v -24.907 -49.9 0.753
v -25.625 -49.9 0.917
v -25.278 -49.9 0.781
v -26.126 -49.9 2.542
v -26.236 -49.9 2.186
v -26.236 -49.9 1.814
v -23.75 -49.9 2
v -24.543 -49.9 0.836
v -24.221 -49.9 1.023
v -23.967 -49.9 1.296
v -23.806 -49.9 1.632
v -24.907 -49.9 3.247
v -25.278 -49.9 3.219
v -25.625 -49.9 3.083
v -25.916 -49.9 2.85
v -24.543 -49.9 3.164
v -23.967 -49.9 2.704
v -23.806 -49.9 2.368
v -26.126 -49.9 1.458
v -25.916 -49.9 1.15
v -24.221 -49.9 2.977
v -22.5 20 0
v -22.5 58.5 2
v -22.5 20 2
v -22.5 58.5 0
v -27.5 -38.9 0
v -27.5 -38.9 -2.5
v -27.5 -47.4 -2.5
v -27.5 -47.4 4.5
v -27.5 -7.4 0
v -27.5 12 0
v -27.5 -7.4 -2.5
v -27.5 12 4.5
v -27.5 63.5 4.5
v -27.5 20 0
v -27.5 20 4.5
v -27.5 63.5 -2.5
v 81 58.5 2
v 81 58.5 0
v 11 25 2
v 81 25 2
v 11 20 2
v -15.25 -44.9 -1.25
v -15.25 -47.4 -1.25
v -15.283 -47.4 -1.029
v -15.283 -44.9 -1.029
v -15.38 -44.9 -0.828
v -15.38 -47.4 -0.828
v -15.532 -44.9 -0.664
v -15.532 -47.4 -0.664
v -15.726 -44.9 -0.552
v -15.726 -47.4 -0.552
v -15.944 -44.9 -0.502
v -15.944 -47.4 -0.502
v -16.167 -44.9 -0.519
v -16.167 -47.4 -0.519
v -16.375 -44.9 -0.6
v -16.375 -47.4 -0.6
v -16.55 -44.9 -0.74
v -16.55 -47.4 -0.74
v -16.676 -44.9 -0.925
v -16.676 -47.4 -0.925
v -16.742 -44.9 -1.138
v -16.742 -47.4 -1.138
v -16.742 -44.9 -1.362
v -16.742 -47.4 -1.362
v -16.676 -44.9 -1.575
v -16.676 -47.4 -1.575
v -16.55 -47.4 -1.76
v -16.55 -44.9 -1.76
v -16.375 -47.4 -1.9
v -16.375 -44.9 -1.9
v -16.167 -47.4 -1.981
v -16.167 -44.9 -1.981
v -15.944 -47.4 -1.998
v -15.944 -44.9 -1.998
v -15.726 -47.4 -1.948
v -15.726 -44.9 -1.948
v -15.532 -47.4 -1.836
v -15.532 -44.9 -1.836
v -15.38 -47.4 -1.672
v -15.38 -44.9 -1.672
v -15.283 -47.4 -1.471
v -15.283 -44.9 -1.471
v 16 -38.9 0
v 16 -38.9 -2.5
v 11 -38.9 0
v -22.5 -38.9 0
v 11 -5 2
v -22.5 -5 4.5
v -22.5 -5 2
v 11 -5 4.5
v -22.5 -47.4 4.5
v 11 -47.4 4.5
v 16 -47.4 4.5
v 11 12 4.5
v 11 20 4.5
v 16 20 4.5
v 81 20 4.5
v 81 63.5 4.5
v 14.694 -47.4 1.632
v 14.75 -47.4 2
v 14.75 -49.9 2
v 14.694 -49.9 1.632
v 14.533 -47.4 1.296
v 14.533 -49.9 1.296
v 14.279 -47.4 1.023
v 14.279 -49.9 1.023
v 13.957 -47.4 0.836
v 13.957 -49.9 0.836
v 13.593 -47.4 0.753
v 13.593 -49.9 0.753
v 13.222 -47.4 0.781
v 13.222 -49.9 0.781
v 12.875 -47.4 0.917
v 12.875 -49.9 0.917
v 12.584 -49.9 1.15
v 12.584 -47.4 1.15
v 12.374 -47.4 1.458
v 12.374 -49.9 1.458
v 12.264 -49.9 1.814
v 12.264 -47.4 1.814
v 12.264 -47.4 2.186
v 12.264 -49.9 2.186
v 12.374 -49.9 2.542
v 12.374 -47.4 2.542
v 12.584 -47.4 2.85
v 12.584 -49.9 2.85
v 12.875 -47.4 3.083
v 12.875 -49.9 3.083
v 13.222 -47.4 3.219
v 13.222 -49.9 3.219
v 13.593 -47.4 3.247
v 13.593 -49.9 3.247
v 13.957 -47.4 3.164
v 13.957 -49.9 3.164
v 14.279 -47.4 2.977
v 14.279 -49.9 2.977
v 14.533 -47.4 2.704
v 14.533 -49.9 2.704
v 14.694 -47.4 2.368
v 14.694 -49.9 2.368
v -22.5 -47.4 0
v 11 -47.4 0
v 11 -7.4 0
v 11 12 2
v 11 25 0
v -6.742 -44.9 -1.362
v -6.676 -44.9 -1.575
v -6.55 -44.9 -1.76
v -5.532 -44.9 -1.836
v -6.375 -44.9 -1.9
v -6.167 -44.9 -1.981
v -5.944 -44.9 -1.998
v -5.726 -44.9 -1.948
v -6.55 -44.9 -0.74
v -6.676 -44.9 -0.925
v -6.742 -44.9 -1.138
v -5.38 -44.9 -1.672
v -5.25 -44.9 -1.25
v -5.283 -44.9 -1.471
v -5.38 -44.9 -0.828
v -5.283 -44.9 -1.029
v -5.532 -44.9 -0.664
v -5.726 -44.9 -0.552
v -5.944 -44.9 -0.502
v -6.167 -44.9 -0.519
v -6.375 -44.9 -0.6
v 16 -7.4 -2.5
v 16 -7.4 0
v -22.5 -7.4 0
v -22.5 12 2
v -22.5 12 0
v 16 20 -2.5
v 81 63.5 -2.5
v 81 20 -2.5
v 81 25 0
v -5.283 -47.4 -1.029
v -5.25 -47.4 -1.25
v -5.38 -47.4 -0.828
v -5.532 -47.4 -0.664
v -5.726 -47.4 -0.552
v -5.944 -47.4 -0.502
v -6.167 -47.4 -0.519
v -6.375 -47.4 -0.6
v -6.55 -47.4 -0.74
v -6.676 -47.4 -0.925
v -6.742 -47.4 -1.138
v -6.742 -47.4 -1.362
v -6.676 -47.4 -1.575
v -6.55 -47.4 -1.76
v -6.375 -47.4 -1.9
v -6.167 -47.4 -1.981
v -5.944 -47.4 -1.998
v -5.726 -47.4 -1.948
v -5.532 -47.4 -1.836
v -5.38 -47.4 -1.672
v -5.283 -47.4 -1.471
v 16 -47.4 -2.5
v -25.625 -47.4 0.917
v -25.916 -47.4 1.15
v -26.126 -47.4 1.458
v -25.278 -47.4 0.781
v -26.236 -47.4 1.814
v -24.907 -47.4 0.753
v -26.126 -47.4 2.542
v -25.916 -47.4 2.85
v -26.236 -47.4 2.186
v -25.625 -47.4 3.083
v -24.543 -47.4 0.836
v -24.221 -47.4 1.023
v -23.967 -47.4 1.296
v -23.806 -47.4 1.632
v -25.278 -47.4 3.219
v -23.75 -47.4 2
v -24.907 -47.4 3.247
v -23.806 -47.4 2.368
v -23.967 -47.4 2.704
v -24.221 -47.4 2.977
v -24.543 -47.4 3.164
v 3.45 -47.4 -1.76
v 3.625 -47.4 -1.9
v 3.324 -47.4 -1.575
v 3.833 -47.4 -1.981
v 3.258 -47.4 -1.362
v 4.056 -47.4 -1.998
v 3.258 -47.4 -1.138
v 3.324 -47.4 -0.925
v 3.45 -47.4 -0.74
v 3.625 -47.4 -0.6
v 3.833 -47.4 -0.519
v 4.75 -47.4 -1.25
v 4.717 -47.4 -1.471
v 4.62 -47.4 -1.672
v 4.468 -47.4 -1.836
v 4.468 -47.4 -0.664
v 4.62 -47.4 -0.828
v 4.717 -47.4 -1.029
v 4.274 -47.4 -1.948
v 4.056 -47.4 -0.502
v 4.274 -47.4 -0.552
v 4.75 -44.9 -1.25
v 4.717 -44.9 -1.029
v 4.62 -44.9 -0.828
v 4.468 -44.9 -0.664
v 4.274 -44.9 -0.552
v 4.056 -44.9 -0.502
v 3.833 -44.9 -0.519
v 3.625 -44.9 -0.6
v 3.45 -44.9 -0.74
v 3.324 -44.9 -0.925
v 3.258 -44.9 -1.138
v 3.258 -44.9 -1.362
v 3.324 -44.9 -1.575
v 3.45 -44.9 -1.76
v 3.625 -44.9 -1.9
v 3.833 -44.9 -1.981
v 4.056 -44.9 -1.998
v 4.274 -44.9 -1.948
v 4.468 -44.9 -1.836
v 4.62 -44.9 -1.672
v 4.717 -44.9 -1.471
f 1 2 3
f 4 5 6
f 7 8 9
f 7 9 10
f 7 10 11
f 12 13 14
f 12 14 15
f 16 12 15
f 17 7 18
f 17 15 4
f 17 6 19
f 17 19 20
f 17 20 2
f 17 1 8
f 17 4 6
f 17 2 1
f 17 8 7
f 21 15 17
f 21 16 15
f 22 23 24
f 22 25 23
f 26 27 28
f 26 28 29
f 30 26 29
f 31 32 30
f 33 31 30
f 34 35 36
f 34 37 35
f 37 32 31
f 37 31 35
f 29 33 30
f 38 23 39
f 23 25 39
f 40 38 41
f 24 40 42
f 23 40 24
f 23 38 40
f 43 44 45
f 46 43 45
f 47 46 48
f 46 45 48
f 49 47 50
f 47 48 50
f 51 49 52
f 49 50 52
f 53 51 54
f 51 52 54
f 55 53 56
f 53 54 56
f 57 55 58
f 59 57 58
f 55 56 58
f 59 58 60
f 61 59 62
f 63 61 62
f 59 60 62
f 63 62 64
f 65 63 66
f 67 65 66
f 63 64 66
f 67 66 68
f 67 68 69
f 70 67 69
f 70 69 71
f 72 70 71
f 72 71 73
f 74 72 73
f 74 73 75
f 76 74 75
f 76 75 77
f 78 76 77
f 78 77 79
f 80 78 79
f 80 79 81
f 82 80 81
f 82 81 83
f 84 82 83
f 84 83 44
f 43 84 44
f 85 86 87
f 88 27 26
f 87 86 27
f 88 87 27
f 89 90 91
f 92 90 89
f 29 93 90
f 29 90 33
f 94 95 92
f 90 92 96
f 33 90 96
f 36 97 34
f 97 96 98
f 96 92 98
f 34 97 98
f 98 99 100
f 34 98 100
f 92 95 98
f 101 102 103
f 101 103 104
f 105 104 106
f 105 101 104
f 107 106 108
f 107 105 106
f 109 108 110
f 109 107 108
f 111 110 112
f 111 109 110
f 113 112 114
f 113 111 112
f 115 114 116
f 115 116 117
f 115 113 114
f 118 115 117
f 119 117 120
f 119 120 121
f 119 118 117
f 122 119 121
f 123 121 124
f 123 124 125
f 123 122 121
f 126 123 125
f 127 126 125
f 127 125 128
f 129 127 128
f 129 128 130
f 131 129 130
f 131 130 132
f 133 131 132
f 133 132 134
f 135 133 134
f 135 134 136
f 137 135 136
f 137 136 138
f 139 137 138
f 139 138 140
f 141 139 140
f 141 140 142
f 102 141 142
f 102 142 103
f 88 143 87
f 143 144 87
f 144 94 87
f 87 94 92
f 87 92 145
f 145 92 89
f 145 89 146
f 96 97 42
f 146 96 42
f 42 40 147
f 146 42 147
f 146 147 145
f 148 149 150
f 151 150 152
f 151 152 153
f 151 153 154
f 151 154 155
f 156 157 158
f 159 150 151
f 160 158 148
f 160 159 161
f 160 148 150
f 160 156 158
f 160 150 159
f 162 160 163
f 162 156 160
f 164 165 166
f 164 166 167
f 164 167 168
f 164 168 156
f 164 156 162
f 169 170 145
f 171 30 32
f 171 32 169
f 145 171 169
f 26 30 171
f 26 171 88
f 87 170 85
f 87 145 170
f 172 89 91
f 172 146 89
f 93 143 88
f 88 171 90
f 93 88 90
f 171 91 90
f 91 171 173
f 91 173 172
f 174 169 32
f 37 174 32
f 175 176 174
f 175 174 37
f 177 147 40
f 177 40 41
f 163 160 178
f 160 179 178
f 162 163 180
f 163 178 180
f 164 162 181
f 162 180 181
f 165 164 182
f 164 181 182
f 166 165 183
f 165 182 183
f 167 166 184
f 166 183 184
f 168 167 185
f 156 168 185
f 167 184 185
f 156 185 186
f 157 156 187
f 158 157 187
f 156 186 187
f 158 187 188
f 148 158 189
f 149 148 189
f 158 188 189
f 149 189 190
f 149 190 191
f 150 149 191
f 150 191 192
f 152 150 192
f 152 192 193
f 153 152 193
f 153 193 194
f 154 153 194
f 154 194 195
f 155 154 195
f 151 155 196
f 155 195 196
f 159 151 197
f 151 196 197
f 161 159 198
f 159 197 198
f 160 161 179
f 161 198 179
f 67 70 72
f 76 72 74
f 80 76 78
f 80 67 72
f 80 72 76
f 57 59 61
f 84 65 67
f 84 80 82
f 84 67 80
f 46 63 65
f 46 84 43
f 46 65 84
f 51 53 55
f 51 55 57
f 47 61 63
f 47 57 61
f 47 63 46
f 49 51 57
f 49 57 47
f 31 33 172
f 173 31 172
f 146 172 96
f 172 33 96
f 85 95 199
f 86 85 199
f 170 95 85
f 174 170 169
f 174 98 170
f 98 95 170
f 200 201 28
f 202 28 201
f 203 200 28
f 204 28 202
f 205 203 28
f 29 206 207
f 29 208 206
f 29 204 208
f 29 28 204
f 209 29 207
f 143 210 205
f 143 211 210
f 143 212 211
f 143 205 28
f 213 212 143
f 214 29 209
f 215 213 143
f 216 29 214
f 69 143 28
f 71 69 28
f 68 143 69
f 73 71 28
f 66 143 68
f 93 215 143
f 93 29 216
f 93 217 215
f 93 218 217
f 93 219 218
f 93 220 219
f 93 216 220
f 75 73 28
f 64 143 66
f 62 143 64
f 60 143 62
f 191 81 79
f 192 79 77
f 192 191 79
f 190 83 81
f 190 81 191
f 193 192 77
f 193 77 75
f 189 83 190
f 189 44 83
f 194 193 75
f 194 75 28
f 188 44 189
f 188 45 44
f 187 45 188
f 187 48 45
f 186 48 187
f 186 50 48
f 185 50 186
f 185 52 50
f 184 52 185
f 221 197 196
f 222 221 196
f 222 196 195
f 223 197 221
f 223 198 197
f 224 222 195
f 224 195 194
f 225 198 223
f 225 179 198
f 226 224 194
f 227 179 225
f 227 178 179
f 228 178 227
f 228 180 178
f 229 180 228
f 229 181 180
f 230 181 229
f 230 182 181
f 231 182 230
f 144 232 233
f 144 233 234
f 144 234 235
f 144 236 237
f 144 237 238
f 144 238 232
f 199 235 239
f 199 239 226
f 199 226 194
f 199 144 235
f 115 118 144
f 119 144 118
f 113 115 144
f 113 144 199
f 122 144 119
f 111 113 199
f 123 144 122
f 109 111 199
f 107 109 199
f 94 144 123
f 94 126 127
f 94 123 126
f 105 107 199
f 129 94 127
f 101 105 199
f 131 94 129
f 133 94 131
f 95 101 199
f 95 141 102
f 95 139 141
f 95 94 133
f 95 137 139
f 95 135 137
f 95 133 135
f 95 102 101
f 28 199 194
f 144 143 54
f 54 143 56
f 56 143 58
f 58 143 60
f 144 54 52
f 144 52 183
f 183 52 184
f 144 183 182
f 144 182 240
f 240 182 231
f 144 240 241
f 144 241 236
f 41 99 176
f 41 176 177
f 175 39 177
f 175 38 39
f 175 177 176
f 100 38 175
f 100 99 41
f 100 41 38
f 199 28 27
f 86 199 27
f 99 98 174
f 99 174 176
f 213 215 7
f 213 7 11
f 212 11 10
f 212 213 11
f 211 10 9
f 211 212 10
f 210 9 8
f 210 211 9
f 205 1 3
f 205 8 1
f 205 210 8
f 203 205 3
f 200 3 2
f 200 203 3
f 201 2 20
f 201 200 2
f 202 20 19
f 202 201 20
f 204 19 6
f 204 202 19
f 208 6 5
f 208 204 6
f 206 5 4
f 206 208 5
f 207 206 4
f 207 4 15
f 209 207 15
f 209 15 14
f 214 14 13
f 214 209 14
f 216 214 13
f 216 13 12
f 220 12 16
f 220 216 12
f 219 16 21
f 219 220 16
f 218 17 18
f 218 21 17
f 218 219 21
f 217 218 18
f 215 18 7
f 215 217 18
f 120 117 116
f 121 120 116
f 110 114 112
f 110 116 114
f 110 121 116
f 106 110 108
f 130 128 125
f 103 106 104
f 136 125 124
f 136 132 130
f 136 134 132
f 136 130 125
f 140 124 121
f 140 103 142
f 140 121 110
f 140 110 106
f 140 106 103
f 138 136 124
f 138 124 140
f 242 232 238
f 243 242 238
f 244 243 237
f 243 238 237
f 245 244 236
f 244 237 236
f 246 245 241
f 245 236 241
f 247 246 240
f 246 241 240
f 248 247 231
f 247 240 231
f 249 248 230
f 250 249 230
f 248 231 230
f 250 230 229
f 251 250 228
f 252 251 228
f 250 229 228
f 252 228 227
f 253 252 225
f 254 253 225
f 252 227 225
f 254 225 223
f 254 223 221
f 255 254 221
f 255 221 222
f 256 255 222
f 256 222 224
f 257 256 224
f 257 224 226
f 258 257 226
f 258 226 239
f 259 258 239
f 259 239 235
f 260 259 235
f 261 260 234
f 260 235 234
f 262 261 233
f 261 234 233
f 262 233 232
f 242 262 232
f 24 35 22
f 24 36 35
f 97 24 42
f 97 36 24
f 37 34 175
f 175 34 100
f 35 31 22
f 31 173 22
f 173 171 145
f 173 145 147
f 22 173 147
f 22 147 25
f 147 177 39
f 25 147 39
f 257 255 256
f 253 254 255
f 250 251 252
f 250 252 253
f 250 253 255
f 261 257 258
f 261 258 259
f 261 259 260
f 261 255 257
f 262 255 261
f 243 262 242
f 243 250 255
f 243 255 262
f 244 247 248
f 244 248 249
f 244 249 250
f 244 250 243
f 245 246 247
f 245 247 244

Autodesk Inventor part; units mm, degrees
ref_plane "YZ Plane" through (0, 0, 0) normal (1, 0, 0) x (0, 1, 0)
sketch "Boceto1" plane through (0, 0, 0) normal (0, 0, 1) x (1, 0, 0)
  line L0 (81, 20) -> (81, 63.5)
  line L1 (-27.5, 63.5) -> (-27.5, -5)
  line L2 (-27.5, -5) -> (16, -5)
  line L3 (16, -5) -> (16, 20)
  line L4 (11, 25) -> (11, -5)
  line L5 (-22.5, 58.5) -> (-22.5, -5)
  line L6 (11, 25) -> (81, 25)
  line L7 (-27.5, 63.5) -> (81, 63.5)
  line L8 (-22.5, 58.5) -> (81, 58.5)
  line L9 (16, 20) -> (81, 20)
  point P0 (0, 0)
  dimension "d7" = 5
  dimension "d68" = 5
  dimension "d69" = 33.5
  dimension "d74" = 5
  dimension "d75" = 33.5
  dimension "d76" = 5
  dimension "d77" = 70
  dimension "d111" = 30
extrude "Extrusión1" add sketch "Boceto1" against normal blind 2.5
extrude "Extrusión2" add sketch "Boceto1" along normal blind 1 contours L9 L3 L2 L4 L6 L0 | L8 L5 L2 L1 L7 L0
ref_plane "Plano de trabajo3" through (29.25, 58.5, 1) normal (0, 0, 1) x (1, 0, 0)
mirror "Simetría3" about plane through (29.25, 58.5, 1) normal (0, 0, 1) of "Extrusión2", "Extrusión1"
sketch "Boceto6" plane through (-27.5, 63.5, 4.5) normal (0, 0, 1) x (1, 0, 0)
  line L0 (108.5, -43.5) -> (43.5, -43.5) projected
  line L1 (0, -68.5) -> (0, 0) projected
  line L2 (0, -43.5) -> (0, -51.5)
  line L3 (43.5, -43.5) -> (43.5, -68.5) projected
  line L4 (0, -43.5) -> (38.5, -43.5)
  line L5 (38.5, -68.5) -> (38.5, -38.5) projected
  line L6 (0, -51.5) -> (38.5, -51.5)
  line L7 (38.5, -43.5) -> (38.5, -51.5)
  point P0 (27.5, -63.5)
  point P1 (43.5, -51.5)
  dimension "d78" = 8
extrude "Extrusión11" cut sketch "Boceto6" against normal blind 4.5
sketch "Boceto7" plane through (-27.5, -5, -2.5) normal (-1, 0, 0) x (0, 0, 1)
  line L0 (0, 0) -> (0, 68.5) projected
  line L1 (0, 0) -> (0, -42.4)
  line L2 (0, 0) -> (7, 0) projected
  line L3 (0, 0) -> (7, 0)
  line L4 (7, 0) -> (7, -42.4)
  line L5 (0, -42.4) -> (86.5, -192.2224)
  line L6 (86.5, -192.2224) -> (89, -192.2224)
  line L7 (89, -192.2224) -> (92.375, -190.2738)
  line L8 (2.5, 0) -> (2.5, -42.4)
  line L9 (0, 0) -> (7, 0) projected
  line L10 (0, 0) -> (2.5, 0)
  line L11 (86.5, -192.2224) -> (89, -192.2224)
  line L12 (89, -192.2224) -> (92.375, -190.2738)
  line L13 (2.5, -42.4) -> (89, -192.2224)
  line L14 (0, -42.4) -> (-1.0904, -42.4)
  line L15 (7, -42.4) -> (92.375, -190.2738)
  line L16 (86.5, -187.8923) -> (89.875, -185.9437)
  point P0 (2.5, 5)
  point P1 (4.5, 0)
  point P2 (-0.5452, -42.4)
  dimension "d81" = 42.4
  dimension "d82" = 173
  dimension "d88" = 120
  dimension "d108" = 5
ref_plane "Plano de trabajo4" through (-5.75, -5, -2.5) normal (1, 0, 0) x (0, 0, -1)
extrude "Extrusión12" add sketch "Boceto7" against normal blind 21.75 contours L2 L8 L13 L6 L5 L1
extrude "Extrusión13" add sketch "Boceto7" against normal blind 5 contours L2 L4 L15 L16 L13 L8
extrude "Extrusión14" add sketch "Boceto7" against normal blind 21.75 contours L13 L16 L15 L7
mirror "Simetría4" about plane through (-5.75, -5, -2.5) normal (1, 0, 0) of "Extrusión12", "Extrusión13", "Extrusión14"
sketch "Boceto8" plane through (-22.5, -47.4, 0) normal (0, 0.5, 0.866) x (1, 0, 0)
  line L0 (0, 0) -> (33.5, 0) projected
  line L1 (16.75, 0) -> (16.75, -5)
  circle A0 centre (16.75, -15.25) radius 10.25
  line L2 (16.75, -25.5) -> (16.75, -30.5)
  circle A1 centre (16.75, -41.5) radius 11
  line L3 (16.75, -52.5) -> (16.75, -57.5)
  circle A2 centre (16.75, -68.69) radius 11.19
  line L4 (16.75, -79.88) -> (16.75, -84.88)
  circle A3 centre (16.75, -96.38) radius 11.5
  line L5 (16.75, -107.88) -> (16.75, -112.88)
  circle A4 centre (16.75, -125.07) radius 12.19
  line L6 (16.75, -137.26) -> (16.75, -142.26)
  circle A5 centre (16.75, -155.01) radius 12.75
  point P0 (22.5, 41.0496)
  dimension "d105" = 25.5
  dimension "d94" = 5
  dimension "d95" = 20.5
  dimension "d96" = 5
  dimension "d97" = 5
  dimension "d98" = 5
  dimension "d99" = 5
  dimension "d100" = 5
  dimension "d101" = 22
  dimension "d102" = 22.38
  dimension "d103" = 23
  dimension "d104" = 24.38
extrude "Extrusión15" cut sketch "Boceto8" against normal blind 21.75
sketch "Boceto9" plane through (-27.5, 63.5, -2.5) normal (-1, 0, 0) x (0, 0, 1)
  line L0 (2.5, -51.5) -> (2.5, -110.9) projected
  line L1 (0, 0) -> (0, -110.9) projected
  line L2 (0, -110.9) -> (2.5, -110.9)
  line L3 (2.5, -110.9) -> (2.5, -70.9)
  line L4 (2.5, -70.9) -> (0, -70.9)
  line L5 (0, -70.9) -> (0, -110.9)
  line L6 (0, -43.5) -> (0, -110.9) projected
  line L7 (0, -102.4) -> (2.5, -102.4)
  point P0 (2.5, -63.5)
  point P1 (7, -110.9)
  dimension "d109" = 2.5
  dimension "d110" = 40
  dimension "d112" = 31.5
extrude "Extrusión16" cut sketch "Boceto9" against normal through all contours L0 L7 L1 L4
ref_plane "Plano de trabajo5" through (-27.5, -47.4, 0) normal (0, -1, 0) x (1, 0, 0)
sketch "Boceto10" plane through (-27.5, -47.4, 0) normal (0, -1, 0) x (1, 0, 0)
  line L0 (43.5, 0) -> (43.5, -2.5) projected
  line L1 (0, 86.5) -> (0, 89.875) projected
  line L2 (43.5, -2.5) -> (0, -2.5)
  line L3 (0, -2.5) -> (0, 89.875)
  line L4 (0, 89.875) -> (43.5, 89.875)
  line L5 (43.5, 89.875) -> (43.5, -2.5)
  point P0 (27.5, 0)
extrude "Extrusión17" cut sketch "Boceto10" along normal through all
sketch "Boceto11" plane through (-27.5, -47.4, 0) normal (0, -1, 0) x (1, 0, 0)
  line L0 (43.5, 4.5) -> (38.5, 4.5) projected
  line L1 (38.5, 0) -> (38.5, 4.5) projected
  line L2 (5, 0) -> (38.5, 0) projected
  line L3 (5, 4.5) -> (5, 0) projected
  line L4 (0, 4.5) -> (5, 4.5) projected
  line L5 (0, -2.5) -> (0, 4.5) projected
  line L6 (0, -2.5) -> (43.5, -2.5) projected
  line L7 (43.5, 4.5) -> (43.5, -2.5) projected
  line L8 (0, 0) -> (0, -2.5) projected
  line L9 (0, -1.25) -> (43.5, -1.25)
  line L10 (43.5, -2.5) -> (43.5, 4.5) projected
  circle A0 centre (2.5, 2) radius 1.25
  line L11 (108.5, 2) -> (5, 2) projected
  circle A1 centre (41, 2) radius 1.25
  circle A2 centre (11.5, -1.25) radius 0.75
  circle A3 centre (21.5, -1.25) radius 0.75
  circle A4 centre (31.5, -1.25) radius 0.75
  point P0 (27.5, 0)
  dimension "d117" = 2.5
  dimension "d118" = 2.5
  dimension "d119" = 38.5
  dimension "d120" = 1.5
  dimension "d121" = 1.5
  dimension "d122" = 1.5
  dimension "d123" = 10
  dimension "d124" = 10
  dimension "d125" = 12
extrude "Extrusión18" add sketch "Boceto11" along normal blind 2.5 contours A1 L11 | L11 A1 | A0
extrude "Extrusión19" cut sketch "Boceto11" against normal blind 2.5 contours A4 L9 | L9 A4 | A3 L9 | L9 A3 | A2 L9 | L9 A2
equation "\"d105\" = UnSol"
equation "\"d94\" = razon"
equation "\"d95\" = diezcen"
equation "\"d96\" = razon"
equation "\"d97\" = razon"
equation "\"d98\" = razon"
equation "\"d99\" = razon"
equation "\"d100\" = razon"
equation "\"d101\" = cincuentacen"
equation "\"d102\" = dossol"
equation "\"d103\" = veintecen"
equation "\"d104\" = cincosol"
equation "\"UnSol\" = 25.5"
equation "\"diezcen\" = 20.5"
equation "\"veintecen\" = 23"
equation "\"cincuentacen\" = 22"
equation "\"dossol\" = 22.38"
equation "\"cincosol\" = 24.38"
equation "\"razon\" = 5"
properties part number "V1"
